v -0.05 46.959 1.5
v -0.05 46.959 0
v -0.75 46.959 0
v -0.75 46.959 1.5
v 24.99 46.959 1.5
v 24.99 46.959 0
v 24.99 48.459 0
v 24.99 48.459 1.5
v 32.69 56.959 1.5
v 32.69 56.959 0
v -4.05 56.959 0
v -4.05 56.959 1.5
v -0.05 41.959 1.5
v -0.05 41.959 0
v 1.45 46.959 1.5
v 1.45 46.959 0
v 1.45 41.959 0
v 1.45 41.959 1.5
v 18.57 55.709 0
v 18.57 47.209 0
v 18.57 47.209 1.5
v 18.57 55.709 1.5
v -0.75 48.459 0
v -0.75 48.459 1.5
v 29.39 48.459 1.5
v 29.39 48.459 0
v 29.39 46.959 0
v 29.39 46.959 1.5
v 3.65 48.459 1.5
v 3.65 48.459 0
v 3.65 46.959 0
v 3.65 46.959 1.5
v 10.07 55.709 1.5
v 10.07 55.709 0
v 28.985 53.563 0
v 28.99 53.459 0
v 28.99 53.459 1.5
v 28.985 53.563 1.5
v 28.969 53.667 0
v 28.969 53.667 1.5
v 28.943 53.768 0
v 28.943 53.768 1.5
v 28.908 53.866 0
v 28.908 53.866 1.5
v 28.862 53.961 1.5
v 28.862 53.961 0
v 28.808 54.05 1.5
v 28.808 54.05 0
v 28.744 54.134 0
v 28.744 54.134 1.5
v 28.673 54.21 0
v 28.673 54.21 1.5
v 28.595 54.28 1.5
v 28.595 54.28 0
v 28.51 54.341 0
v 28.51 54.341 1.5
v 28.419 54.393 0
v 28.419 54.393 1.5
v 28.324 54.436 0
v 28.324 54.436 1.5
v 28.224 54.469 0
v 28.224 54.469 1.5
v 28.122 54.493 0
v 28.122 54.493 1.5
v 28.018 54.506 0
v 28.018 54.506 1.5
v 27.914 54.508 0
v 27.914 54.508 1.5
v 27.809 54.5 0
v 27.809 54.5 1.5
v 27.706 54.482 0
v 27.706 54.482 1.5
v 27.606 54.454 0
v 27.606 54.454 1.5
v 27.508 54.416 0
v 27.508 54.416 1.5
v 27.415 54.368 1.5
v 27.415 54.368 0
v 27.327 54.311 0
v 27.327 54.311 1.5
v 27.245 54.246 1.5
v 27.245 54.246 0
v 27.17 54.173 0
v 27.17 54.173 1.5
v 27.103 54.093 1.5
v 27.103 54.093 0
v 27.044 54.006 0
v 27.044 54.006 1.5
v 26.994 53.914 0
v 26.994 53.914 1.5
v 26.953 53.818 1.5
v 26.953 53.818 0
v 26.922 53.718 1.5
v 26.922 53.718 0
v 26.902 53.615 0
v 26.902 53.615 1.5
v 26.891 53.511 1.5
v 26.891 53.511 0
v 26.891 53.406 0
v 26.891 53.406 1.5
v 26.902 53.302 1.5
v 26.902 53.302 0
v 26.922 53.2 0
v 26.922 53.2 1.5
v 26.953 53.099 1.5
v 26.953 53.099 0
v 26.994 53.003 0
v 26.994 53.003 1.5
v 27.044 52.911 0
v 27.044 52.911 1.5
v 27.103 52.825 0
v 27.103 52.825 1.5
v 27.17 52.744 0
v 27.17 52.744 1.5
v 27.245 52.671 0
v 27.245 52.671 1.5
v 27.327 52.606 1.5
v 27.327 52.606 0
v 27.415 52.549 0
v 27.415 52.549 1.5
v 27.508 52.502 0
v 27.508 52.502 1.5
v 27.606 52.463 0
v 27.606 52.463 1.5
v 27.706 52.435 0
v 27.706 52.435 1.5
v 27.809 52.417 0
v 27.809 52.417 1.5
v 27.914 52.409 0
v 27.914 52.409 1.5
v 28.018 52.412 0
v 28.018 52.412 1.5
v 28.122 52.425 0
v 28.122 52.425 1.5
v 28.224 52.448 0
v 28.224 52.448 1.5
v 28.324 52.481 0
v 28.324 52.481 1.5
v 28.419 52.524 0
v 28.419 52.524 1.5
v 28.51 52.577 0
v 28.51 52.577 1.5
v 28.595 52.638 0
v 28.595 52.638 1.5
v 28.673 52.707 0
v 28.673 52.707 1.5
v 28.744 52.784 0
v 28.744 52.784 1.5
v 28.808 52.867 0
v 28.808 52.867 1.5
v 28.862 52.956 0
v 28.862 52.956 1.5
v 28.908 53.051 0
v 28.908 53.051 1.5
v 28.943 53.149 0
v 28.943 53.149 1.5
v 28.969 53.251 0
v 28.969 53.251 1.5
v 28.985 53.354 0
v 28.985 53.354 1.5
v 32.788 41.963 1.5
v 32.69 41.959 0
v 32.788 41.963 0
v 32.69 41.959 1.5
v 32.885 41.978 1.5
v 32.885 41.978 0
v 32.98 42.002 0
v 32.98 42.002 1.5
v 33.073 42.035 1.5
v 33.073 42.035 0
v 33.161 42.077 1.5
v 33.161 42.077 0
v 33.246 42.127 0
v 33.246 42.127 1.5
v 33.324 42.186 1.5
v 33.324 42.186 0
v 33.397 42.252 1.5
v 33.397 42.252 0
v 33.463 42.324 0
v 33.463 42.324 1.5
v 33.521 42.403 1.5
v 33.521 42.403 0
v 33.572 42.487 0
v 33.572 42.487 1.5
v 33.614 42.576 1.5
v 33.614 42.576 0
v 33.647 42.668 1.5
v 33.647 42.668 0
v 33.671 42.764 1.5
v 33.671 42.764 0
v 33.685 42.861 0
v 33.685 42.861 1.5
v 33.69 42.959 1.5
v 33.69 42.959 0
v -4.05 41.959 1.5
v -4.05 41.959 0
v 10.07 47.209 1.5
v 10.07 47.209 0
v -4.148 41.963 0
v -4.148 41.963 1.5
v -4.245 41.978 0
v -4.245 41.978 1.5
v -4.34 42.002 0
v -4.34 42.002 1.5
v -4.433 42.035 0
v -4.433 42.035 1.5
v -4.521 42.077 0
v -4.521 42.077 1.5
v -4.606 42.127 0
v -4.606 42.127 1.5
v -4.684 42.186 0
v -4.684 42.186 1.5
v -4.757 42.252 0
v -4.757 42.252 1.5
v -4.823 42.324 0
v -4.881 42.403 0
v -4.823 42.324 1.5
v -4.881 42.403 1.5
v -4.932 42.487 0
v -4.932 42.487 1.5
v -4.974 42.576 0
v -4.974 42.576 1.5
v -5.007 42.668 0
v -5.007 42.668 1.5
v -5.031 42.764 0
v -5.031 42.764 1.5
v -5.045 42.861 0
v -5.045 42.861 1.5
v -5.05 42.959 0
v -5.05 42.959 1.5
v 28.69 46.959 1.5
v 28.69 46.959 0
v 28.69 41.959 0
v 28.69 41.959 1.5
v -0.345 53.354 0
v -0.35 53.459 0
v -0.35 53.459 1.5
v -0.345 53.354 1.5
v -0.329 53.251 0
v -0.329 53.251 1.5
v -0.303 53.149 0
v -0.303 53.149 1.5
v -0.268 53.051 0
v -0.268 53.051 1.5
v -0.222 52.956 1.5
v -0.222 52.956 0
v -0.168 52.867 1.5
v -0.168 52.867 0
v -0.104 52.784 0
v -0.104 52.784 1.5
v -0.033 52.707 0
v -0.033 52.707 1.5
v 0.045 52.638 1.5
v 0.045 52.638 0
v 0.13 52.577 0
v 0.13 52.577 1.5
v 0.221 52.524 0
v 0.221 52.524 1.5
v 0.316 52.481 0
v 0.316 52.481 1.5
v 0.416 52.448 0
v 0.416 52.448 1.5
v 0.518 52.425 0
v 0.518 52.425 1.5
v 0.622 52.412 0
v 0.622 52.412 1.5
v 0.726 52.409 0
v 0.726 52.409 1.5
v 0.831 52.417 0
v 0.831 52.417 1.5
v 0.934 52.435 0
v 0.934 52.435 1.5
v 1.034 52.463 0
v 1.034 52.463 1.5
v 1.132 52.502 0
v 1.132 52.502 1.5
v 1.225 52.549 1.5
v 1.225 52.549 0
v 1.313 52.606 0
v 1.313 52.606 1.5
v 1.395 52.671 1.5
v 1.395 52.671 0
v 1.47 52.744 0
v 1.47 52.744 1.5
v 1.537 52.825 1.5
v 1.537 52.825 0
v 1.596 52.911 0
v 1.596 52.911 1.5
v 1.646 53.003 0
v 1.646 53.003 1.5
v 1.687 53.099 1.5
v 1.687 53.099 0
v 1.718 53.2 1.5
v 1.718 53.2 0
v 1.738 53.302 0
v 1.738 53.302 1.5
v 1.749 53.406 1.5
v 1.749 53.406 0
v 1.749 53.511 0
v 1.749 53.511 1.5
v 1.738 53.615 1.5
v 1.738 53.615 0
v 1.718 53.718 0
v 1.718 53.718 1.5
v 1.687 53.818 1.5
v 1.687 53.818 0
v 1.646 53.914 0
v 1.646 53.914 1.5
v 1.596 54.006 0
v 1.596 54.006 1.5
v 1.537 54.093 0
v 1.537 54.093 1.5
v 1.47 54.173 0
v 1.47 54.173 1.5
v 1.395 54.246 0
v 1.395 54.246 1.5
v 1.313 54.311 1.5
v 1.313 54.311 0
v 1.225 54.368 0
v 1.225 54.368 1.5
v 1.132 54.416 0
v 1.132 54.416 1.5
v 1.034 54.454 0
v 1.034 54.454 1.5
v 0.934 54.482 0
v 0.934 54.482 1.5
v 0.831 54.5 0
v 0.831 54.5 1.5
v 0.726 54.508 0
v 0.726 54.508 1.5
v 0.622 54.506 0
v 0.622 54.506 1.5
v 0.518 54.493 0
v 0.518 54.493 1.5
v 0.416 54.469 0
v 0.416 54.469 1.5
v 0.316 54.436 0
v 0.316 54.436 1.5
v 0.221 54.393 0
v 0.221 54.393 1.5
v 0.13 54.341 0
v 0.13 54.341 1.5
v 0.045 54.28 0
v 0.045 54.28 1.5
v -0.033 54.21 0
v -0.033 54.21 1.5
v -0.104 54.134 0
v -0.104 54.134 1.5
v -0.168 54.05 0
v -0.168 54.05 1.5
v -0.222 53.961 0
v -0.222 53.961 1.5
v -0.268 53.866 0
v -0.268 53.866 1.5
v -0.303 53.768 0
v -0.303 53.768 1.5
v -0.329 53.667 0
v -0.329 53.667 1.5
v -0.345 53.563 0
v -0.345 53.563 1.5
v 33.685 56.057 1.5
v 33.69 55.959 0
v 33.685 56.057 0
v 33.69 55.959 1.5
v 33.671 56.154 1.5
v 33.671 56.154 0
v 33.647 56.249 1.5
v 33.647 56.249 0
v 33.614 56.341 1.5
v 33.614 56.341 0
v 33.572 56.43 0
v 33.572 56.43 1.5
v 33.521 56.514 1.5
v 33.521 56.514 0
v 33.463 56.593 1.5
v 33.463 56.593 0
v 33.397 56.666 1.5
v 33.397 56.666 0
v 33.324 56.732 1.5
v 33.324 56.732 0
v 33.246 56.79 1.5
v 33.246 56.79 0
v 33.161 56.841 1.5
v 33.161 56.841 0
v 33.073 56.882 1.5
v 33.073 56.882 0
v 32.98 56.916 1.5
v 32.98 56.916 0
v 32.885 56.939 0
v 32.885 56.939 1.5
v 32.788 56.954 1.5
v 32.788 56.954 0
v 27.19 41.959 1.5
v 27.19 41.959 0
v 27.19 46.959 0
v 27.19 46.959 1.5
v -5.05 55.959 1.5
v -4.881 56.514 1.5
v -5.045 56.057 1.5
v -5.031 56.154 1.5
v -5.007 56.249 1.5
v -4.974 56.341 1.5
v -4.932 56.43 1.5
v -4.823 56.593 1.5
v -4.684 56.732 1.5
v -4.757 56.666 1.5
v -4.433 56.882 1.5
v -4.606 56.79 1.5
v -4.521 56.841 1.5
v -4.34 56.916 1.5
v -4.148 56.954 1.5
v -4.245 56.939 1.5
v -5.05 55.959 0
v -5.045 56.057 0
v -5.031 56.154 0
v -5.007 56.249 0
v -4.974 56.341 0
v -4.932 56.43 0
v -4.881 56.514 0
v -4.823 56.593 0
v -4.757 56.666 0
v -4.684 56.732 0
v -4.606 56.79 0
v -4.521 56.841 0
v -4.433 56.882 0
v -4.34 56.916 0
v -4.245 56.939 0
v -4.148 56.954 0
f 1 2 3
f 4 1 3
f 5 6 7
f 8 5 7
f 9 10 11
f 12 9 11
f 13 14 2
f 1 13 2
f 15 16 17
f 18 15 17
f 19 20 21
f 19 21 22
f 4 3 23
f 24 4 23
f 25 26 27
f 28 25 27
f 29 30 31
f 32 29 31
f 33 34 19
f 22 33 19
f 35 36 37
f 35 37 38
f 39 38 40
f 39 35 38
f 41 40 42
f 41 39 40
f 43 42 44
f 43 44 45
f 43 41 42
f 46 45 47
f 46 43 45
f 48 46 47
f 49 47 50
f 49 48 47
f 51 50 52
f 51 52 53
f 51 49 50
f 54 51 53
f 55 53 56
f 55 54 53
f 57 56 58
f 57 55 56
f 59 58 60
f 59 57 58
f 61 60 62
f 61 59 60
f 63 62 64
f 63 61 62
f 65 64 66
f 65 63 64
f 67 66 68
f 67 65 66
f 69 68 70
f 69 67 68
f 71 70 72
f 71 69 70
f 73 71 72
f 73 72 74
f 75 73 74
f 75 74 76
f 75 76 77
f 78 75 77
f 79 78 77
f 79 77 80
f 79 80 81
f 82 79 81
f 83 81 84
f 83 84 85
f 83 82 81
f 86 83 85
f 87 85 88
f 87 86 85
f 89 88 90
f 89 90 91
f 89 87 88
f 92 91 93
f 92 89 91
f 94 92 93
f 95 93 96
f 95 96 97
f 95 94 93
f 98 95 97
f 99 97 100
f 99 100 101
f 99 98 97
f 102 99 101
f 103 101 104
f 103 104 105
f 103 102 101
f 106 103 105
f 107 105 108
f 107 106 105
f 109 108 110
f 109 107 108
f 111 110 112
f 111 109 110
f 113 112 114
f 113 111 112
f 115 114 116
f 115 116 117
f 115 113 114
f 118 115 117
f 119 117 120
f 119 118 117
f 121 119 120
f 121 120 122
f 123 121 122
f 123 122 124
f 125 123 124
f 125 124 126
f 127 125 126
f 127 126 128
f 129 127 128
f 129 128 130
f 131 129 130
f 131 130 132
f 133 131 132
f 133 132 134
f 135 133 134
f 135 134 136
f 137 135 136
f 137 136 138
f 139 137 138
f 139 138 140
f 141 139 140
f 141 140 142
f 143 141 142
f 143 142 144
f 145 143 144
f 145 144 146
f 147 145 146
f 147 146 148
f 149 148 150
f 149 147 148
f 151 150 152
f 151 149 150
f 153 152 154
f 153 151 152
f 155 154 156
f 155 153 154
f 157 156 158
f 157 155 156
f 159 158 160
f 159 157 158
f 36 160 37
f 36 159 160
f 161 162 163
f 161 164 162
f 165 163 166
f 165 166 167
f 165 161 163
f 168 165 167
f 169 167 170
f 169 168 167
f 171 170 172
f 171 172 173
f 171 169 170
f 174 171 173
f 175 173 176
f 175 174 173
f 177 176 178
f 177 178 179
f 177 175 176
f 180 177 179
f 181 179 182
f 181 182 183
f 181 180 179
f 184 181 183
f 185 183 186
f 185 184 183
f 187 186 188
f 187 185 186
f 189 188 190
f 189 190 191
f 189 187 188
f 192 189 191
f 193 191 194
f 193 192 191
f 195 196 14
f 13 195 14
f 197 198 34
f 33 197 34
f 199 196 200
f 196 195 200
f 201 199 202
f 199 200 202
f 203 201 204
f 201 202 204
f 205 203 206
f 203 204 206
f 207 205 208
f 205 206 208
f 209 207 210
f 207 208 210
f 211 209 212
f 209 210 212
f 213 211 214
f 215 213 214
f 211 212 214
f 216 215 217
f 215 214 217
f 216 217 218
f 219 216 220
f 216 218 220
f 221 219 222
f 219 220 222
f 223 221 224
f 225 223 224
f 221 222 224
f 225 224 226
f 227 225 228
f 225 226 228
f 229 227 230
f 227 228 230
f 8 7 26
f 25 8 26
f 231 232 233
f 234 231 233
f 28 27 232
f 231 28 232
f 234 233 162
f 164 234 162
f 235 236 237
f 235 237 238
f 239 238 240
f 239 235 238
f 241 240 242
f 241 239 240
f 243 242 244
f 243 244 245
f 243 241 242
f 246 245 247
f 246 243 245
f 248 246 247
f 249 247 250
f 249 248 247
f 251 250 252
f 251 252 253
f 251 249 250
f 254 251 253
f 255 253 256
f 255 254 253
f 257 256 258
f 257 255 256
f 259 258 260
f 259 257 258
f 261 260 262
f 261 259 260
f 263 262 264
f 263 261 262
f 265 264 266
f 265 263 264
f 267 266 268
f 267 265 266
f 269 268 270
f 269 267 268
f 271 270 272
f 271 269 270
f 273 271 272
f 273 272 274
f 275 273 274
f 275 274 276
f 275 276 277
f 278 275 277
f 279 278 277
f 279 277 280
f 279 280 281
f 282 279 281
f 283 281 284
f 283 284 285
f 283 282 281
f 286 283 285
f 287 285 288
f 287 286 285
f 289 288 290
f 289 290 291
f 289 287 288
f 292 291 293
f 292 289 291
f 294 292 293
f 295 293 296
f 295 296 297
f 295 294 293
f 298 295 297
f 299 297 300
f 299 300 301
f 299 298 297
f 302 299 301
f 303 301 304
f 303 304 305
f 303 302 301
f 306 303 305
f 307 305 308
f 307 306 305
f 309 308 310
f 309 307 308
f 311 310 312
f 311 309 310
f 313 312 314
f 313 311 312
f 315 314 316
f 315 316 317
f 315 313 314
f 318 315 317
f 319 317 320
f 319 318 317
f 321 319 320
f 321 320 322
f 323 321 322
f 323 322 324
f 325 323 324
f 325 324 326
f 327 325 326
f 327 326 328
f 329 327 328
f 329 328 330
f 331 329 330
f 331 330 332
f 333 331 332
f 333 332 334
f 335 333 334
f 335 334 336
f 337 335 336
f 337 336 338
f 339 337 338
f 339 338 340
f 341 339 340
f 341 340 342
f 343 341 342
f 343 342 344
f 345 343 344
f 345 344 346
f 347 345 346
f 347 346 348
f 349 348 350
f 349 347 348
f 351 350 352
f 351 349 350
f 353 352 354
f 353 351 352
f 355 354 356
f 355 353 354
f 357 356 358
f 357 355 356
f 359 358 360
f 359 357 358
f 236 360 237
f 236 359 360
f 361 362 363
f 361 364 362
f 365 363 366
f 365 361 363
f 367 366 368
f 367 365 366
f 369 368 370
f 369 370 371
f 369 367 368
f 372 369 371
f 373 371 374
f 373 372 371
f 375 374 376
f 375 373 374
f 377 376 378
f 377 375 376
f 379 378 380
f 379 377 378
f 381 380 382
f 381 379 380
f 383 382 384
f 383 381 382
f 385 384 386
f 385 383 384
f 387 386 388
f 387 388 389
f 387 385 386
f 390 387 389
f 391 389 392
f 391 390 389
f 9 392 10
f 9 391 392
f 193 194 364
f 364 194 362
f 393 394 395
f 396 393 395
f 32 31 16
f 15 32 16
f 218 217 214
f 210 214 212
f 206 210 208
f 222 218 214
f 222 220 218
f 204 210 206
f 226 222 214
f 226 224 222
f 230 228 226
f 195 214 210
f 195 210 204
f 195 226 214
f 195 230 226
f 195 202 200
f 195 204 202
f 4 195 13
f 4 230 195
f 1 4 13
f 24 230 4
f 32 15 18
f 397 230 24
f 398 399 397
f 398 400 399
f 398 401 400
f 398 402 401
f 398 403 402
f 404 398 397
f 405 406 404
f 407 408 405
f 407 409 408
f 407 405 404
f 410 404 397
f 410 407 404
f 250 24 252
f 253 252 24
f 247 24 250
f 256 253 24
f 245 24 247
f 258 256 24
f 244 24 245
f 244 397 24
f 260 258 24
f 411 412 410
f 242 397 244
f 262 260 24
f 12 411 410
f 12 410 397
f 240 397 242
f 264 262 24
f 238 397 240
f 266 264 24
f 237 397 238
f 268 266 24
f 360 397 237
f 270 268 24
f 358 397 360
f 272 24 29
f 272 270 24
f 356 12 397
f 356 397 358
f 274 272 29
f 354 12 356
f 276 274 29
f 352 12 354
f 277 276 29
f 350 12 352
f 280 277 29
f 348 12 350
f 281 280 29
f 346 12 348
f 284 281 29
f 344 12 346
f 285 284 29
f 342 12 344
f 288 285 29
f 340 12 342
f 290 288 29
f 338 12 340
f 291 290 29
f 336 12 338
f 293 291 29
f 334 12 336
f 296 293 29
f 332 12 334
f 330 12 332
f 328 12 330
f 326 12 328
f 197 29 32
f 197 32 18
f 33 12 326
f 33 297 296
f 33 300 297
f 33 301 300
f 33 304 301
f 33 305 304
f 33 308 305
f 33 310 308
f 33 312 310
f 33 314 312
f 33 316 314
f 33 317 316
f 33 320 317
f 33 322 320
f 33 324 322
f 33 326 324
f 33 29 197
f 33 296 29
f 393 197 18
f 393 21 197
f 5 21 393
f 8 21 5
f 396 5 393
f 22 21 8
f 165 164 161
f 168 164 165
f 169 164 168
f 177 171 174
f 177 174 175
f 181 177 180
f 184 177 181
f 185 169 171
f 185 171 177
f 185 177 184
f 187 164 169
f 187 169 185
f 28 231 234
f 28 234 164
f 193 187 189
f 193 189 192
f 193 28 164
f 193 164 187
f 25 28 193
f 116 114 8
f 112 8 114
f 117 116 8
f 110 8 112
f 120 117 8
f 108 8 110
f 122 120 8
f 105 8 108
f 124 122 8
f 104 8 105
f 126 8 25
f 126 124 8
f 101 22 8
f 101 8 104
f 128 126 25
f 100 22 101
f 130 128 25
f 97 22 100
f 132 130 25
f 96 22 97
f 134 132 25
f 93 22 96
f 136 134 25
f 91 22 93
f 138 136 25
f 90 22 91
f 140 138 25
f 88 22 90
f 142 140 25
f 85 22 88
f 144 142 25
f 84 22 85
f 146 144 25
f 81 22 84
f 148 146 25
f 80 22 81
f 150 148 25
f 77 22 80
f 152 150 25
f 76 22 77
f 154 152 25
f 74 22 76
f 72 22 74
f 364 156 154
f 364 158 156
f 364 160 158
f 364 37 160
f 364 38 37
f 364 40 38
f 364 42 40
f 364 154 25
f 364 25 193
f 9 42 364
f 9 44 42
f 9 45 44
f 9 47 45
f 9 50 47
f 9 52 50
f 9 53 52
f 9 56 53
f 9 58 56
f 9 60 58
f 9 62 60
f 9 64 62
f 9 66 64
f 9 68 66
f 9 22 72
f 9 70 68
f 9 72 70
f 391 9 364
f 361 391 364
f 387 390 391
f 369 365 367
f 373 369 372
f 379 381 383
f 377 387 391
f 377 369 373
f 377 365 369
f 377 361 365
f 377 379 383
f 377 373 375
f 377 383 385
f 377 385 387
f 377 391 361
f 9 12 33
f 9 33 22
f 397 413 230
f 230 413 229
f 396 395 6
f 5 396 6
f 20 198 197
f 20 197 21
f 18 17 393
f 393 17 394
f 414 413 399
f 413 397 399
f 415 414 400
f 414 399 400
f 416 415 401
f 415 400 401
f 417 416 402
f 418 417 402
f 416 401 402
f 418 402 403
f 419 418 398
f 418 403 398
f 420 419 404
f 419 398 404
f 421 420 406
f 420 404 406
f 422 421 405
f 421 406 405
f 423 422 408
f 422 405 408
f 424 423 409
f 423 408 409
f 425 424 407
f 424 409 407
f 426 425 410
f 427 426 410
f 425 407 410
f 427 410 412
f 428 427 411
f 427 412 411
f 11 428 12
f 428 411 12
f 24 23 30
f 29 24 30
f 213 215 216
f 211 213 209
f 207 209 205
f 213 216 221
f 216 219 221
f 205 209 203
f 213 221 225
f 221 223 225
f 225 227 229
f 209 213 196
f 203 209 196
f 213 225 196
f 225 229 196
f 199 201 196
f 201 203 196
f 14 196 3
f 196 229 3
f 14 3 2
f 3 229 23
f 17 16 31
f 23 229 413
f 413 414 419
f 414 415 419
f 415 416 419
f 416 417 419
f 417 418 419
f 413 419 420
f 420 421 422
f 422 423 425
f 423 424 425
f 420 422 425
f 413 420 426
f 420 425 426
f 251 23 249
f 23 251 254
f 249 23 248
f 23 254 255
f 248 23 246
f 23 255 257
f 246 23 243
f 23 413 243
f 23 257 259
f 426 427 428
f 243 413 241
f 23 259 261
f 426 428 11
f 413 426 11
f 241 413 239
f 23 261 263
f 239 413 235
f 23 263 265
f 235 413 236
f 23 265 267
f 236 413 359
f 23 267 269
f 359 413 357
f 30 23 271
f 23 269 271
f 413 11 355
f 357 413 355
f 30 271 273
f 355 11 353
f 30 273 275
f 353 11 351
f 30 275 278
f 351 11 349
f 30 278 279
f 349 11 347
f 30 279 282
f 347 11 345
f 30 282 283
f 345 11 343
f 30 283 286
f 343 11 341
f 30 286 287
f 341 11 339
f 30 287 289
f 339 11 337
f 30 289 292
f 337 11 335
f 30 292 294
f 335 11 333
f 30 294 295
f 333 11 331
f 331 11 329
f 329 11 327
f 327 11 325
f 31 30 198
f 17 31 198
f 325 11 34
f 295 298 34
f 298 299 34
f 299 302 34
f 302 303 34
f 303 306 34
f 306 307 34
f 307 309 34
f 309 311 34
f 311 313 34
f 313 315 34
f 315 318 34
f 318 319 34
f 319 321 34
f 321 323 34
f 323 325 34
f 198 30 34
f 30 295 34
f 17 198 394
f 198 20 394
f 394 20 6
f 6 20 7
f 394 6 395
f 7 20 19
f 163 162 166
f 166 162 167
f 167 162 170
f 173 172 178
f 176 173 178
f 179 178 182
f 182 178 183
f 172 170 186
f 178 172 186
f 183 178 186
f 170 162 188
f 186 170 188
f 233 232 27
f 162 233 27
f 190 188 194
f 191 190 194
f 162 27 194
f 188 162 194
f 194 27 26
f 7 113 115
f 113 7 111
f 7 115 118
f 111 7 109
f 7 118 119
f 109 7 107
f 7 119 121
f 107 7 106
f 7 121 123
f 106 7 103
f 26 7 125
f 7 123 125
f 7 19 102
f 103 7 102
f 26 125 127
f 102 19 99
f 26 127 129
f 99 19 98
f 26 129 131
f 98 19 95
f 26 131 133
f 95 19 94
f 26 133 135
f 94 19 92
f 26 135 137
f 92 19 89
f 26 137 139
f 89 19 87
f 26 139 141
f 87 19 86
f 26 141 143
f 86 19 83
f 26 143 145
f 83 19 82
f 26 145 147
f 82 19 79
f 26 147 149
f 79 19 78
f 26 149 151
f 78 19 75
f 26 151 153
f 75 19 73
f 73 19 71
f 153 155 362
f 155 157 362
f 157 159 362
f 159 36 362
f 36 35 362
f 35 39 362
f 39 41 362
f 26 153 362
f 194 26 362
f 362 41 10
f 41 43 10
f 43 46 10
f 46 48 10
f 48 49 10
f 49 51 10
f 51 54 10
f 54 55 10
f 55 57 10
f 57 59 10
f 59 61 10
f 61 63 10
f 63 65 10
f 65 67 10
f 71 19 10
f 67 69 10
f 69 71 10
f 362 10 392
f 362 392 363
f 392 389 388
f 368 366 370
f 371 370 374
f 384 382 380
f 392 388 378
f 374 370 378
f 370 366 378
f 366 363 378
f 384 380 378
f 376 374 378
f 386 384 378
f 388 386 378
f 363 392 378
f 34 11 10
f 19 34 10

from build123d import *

# Parameters (mm, degrees)
SKETCH_1_R      = 1.05
SKETCH_1_W      = 8.5
SKETCH_1_H      = 8.5
EXTRUDE_1_DEPTH = 1.5
FILLET_1_R      = 1


with BuildPart() as part:
    # 草图1 → 凸台-拉伸1 (new body)
    with BuildSketch(Plane.XY):
        Polygon((1.45, 41.958612035), (27.19, 41.958612035), (27.19, 46.958612035), (24.99, 46.958612035), (24.99, 48.458612035), (29.39, 48.458612035), (29.39, 46.958612035), (28.69, 46.958612035), (28.69, 41.958612035), (33.69, 41.958612035), (33.69, 56.958612035), (14.32, 56.958612035), (-5.05, 56.958612035), (-5.05, 41.958612035), (-0.05, 41.958612035), (-0.05, 46.958612035), (-0.75, 46.958612035), (-0.75, 48.458612035), (3.65, 48.458612035), (3.65, 46.958612035), (1.45, 46.958612035), align=None)
        with Locations((27.94, 53.458612035)):
            Circle(SKETCH_1_R, mode=Mode.SUBTRACT)
        with Locations(Location((0.7, 53.458612035, 0), (0, 0, 180))):
            Circle(SKETCH_1_R, mode=Mode.SUBTRACT)
        with Locations((14.32, 51.458612035)):
            Rectangle(SKETCH_1_W, SKETCH_1_H, mode=Mode.SUBTRACT)
    extrude(amount=EXTRUDE_1_DEPTH)

    # 圆角1
    fillet_1_edges = [part.edges().sort_by_distance(p)[0] for p in [
        (-5.05, 41.958612035, 0.75),
        (-5.05, 56.958612035, 0.75),
        (33.69, 56.958612035, 0.75),
        (33.69, 41.958612035, 0.75),
    ]]
    fillet(fillet_1_edges, radius=FILLET_1_R)


solid = part.part
